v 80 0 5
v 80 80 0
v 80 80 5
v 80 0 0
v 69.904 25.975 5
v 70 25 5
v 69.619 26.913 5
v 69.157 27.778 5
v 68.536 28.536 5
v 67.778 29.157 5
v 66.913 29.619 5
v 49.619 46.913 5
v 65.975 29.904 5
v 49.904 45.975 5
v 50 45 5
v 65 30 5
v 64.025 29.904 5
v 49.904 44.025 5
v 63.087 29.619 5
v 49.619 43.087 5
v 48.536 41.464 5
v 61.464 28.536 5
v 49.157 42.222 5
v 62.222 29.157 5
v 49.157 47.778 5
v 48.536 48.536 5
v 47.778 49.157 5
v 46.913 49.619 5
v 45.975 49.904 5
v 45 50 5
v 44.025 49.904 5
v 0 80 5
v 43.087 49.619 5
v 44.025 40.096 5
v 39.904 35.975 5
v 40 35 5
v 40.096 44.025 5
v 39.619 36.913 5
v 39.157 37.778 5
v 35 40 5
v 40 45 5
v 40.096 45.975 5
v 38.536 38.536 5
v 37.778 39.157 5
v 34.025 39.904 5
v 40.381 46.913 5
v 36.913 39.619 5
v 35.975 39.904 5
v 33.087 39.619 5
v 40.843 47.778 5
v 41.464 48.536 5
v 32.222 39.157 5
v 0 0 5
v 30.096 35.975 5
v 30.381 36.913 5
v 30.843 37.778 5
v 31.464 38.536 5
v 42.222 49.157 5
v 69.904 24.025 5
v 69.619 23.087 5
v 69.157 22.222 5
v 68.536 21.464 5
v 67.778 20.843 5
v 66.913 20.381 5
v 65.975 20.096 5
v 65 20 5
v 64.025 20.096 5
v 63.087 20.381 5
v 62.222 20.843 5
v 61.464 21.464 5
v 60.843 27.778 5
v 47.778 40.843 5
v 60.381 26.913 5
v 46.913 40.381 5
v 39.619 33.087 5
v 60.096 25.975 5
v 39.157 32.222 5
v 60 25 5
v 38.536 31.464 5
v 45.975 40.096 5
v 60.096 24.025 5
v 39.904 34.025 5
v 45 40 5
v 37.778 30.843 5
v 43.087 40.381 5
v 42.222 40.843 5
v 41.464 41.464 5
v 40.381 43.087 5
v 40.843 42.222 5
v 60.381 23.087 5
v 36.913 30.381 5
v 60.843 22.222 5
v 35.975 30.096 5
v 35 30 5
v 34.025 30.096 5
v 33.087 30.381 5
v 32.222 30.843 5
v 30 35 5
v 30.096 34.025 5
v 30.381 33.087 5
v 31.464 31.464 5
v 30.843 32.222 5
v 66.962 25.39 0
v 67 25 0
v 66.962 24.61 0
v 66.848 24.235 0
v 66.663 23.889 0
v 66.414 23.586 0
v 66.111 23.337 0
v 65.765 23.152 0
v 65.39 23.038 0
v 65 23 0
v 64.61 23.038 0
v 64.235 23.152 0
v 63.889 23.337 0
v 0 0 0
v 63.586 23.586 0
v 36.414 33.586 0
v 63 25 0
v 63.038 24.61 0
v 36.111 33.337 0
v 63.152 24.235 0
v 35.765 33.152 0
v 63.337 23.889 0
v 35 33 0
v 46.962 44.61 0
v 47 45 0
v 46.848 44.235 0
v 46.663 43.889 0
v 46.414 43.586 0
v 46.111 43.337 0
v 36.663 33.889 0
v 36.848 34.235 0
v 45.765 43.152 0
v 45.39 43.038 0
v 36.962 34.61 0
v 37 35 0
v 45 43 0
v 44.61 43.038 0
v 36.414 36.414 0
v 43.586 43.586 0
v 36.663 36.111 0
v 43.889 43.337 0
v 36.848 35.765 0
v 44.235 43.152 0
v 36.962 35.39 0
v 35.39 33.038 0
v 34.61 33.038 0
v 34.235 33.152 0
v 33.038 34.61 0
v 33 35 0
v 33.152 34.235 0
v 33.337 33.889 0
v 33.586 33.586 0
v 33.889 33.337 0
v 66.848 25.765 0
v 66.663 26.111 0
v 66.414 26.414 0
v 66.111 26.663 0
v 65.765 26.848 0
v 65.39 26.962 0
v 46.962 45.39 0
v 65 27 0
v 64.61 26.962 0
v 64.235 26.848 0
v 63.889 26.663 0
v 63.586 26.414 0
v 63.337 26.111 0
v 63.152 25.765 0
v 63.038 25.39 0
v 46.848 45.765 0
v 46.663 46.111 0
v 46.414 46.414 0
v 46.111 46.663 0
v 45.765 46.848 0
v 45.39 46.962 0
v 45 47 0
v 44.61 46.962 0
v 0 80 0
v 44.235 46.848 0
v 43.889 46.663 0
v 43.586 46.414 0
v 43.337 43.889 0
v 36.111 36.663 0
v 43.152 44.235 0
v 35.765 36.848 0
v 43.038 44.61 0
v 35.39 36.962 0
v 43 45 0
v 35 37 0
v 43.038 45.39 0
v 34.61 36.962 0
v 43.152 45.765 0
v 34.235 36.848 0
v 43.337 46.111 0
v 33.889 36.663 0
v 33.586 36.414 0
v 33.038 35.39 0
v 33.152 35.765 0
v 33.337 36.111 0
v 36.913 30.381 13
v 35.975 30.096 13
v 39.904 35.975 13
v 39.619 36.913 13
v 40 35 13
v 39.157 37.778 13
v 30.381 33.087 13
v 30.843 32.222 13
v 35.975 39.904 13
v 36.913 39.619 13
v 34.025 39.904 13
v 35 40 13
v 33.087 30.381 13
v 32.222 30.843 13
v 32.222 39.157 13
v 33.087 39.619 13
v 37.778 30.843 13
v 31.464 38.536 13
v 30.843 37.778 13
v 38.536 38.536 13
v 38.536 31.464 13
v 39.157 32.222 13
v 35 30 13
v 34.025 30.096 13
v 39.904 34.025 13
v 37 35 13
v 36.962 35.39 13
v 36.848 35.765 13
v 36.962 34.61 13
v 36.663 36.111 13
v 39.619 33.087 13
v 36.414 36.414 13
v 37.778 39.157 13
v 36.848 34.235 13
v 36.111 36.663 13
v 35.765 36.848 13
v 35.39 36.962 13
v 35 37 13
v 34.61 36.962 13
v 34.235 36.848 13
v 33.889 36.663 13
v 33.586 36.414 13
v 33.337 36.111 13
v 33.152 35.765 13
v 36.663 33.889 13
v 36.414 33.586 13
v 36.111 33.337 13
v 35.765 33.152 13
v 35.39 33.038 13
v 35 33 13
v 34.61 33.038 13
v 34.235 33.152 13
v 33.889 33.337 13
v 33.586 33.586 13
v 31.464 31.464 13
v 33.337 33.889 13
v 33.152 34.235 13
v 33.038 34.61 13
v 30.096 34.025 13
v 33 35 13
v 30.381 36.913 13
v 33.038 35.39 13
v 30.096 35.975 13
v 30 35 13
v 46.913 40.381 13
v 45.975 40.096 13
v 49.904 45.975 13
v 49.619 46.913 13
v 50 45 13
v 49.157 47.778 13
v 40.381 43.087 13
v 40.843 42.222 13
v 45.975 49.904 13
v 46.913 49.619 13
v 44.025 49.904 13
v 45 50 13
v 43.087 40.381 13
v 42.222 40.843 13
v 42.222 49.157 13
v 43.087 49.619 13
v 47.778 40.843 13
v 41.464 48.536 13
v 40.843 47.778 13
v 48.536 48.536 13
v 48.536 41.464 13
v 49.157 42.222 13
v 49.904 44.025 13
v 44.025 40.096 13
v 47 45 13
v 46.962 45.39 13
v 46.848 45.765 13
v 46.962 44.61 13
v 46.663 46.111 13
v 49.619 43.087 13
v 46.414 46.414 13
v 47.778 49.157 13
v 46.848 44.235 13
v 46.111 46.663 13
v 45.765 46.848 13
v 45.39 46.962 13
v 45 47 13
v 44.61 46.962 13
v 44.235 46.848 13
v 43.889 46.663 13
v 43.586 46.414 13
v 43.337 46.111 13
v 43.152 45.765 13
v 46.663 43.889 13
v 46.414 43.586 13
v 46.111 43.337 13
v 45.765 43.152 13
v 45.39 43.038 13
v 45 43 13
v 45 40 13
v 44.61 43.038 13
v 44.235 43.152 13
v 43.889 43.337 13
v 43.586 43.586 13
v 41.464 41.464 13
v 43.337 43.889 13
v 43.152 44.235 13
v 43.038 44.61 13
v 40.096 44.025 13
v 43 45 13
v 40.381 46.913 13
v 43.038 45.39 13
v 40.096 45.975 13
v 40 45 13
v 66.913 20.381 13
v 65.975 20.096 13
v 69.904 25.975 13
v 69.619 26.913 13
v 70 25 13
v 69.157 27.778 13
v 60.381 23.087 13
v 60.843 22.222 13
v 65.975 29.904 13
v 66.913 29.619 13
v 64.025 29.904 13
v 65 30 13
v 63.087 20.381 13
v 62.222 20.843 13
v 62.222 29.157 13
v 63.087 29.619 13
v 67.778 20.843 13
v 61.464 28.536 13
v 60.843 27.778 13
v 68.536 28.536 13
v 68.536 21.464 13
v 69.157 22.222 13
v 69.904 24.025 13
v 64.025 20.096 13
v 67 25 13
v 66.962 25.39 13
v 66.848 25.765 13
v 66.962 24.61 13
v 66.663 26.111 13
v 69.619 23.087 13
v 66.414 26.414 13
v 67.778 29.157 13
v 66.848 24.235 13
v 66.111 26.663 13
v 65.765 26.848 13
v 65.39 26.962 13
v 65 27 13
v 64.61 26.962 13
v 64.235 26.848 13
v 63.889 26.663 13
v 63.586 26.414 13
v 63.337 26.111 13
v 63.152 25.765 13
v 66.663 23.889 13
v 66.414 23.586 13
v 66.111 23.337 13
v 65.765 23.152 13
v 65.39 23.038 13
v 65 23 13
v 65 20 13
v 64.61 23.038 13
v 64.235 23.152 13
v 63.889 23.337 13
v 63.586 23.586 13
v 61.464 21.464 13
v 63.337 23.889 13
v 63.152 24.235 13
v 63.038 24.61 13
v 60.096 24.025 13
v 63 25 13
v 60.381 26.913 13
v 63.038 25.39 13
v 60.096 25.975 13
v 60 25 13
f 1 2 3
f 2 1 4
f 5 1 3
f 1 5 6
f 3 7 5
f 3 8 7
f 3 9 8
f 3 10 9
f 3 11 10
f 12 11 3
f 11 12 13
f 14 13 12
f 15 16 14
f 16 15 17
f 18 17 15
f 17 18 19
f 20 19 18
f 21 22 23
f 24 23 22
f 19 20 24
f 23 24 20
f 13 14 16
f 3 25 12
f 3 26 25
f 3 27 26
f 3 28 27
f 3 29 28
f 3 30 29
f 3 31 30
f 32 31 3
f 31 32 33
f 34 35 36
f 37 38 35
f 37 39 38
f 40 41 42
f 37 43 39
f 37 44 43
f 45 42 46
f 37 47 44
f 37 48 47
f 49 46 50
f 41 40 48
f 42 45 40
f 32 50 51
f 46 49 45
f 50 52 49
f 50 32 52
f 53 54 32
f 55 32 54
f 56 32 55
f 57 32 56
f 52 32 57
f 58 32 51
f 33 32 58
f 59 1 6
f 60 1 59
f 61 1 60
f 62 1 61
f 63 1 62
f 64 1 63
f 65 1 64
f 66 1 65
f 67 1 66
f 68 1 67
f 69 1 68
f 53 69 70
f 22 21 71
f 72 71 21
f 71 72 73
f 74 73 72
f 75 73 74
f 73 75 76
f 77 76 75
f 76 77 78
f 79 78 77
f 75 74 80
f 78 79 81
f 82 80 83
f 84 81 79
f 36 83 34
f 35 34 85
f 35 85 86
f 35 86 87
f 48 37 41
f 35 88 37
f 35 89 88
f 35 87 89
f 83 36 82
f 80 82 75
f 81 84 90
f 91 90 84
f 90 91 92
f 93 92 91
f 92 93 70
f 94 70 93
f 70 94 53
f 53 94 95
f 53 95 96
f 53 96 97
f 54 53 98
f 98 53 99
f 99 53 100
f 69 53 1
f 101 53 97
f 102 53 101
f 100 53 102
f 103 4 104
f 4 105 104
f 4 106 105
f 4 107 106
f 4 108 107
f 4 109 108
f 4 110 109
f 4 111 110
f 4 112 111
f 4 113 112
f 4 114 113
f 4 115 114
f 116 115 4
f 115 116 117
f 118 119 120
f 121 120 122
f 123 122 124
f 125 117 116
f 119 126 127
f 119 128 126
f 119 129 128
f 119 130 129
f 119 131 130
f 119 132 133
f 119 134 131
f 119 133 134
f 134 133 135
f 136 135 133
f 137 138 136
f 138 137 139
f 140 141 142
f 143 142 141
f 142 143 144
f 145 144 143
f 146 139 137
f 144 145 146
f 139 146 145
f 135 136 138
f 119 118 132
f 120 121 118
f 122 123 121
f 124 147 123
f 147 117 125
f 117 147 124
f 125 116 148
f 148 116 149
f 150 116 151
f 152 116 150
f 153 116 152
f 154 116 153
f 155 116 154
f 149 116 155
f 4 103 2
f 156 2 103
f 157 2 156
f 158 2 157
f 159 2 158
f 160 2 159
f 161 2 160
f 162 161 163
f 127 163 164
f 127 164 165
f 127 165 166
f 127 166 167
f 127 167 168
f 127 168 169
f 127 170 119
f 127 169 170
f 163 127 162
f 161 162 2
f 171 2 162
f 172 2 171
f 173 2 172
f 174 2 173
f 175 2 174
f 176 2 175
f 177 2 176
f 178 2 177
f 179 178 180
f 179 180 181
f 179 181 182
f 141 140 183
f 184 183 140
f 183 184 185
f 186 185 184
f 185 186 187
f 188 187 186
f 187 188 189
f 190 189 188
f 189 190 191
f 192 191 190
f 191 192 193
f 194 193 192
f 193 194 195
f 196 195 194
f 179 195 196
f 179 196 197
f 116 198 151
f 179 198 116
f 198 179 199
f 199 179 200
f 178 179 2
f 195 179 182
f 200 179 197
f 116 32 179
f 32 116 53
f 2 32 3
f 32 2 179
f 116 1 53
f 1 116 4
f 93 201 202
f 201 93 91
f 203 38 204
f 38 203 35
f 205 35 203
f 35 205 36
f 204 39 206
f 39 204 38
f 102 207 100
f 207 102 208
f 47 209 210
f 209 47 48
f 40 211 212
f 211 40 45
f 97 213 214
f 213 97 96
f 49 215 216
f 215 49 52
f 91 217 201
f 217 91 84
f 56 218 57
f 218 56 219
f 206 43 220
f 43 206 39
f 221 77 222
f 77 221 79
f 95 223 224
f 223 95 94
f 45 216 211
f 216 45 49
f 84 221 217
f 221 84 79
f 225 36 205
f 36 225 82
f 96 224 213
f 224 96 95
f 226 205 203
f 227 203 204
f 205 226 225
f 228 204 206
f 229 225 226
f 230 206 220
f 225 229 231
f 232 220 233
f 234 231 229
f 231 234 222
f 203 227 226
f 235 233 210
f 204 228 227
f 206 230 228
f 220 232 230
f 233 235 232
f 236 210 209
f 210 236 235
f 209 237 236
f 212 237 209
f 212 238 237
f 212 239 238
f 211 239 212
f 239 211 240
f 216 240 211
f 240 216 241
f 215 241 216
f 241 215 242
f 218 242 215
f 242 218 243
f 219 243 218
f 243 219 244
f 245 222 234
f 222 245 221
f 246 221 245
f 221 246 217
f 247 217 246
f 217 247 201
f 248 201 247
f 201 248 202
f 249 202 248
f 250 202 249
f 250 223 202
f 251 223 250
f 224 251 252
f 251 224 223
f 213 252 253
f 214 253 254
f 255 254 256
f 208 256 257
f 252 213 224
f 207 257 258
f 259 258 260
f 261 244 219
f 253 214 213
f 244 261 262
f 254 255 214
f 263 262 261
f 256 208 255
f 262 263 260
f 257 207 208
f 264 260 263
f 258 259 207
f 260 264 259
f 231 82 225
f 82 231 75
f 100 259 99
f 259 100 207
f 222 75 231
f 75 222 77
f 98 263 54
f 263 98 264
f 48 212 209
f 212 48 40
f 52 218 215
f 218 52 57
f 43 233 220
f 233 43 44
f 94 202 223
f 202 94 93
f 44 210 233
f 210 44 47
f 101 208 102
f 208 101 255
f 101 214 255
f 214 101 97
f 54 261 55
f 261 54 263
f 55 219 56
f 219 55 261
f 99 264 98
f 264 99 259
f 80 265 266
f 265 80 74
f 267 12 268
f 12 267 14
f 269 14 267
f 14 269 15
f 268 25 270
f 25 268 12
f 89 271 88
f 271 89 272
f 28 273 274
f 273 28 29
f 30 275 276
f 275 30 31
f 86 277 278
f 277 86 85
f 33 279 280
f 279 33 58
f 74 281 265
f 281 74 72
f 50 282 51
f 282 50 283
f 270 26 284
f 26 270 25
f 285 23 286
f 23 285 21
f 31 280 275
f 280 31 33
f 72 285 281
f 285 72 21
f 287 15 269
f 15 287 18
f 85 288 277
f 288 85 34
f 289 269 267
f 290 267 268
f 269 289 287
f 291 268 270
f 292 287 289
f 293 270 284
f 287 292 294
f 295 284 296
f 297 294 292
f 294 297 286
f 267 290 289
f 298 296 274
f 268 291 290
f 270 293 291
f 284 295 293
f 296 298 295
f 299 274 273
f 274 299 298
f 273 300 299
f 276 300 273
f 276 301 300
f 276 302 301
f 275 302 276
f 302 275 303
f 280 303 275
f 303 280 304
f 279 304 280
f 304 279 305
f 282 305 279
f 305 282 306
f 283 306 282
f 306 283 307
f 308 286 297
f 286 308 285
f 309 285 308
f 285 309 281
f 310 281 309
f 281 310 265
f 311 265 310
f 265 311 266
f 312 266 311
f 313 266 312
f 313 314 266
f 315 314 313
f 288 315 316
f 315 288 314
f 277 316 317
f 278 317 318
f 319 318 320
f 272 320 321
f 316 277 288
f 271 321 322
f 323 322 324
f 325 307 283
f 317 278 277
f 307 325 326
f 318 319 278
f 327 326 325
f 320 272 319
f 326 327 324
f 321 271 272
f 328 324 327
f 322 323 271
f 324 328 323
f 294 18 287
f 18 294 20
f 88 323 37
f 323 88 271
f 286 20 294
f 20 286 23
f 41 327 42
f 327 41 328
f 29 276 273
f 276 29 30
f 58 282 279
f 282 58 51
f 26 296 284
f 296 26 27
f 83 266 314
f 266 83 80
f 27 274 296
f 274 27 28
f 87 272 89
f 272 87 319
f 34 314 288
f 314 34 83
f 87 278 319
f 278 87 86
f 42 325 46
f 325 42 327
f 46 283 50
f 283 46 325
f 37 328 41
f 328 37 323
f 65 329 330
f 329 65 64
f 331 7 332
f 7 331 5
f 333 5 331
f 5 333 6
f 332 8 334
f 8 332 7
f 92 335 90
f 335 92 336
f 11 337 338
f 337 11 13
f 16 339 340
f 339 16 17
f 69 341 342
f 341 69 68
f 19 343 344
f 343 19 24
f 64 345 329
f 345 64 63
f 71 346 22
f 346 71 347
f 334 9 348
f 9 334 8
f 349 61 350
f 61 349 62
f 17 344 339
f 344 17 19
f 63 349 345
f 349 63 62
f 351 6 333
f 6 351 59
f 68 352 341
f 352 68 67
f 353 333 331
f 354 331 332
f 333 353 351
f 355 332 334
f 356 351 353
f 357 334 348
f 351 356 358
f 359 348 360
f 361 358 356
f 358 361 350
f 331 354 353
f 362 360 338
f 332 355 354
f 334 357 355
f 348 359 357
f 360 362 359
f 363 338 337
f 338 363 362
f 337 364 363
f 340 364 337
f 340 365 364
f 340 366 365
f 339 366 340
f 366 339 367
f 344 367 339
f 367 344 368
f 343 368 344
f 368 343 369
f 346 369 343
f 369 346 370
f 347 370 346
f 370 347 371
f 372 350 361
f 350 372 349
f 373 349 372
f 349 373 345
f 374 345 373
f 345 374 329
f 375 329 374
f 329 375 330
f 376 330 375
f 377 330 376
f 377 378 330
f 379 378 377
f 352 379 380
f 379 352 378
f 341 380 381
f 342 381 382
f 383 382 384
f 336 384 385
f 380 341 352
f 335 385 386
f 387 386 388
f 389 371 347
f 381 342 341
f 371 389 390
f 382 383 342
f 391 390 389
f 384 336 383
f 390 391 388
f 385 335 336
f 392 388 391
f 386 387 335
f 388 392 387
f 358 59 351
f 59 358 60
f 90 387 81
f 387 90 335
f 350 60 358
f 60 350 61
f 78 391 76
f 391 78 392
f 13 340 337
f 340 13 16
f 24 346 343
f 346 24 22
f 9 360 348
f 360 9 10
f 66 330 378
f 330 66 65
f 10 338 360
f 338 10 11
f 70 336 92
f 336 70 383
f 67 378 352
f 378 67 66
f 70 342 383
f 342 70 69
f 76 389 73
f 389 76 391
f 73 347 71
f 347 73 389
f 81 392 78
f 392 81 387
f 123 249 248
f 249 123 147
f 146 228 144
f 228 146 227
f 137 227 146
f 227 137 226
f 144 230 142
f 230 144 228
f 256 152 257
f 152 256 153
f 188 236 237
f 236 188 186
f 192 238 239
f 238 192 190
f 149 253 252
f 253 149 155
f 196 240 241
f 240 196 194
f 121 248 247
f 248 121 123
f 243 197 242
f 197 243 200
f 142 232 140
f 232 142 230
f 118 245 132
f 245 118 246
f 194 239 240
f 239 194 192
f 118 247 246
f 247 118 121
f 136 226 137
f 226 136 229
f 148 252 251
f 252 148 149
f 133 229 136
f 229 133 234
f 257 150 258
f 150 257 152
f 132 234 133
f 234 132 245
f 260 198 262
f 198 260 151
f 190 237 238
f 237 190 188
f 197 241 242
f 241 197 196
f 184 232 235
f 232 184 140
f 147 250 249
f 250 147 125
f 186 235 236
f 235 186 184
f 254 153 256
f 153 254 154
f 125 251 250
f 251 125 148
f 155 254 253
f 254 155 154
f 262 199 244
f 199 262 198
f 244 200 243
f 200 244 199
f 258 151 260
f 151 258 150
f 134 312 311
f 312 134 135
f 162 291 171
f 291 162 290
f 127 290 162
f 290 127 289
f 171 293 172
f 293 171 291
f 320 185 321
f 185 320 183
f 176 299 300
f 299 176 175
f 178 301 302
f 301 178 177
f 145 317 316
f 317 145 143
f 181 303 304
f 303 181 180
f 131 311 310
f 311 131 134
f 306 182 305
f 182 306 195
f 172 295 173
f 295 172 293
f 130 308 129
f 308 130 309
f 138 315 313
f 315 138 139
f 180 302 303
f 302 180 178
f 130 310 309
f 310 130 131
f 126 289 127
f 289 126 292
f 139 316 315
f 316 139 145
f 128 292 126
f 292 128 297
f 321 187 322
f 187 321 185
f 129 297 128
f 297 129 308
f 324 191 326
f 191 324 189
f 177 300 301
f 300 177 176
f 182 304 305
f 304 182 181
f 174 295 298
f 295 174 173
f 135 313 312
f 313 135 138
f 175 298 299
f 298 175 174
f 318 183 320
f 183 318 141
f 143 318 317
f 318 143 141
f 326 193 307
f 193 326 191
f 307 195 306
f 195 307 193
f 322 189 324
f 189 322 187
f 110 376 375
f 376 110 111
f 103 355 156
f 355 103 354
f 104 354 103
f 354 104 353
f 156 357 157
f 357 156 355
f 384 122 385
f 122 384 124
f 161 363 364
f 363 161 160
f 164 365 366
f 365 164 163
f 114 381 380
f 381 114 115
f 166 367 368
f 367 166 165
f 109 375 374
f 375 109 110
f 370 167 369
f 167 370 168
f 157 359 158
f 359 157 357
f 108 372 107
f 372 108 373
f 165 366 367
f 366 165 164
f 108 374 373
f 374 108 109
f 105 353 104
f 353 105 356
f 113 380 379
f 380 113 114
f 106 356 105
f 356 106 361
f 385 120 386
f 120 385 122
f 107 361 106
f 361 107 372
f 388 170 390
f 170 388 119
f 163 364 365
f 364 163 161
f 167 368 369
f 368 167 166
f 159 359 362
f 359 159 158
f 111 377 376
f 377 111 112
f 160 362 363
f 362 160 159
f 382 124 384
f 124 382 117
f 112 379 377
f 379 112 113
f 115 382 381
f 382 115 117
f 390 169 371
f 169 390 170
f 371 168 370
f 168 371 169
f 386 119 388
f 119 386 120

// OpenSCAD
$fn = 32;

// ----------------------------------------------------------------------
// Boss field: plate with bosses at given coordinates
// ----------------------------------------------------------------------

// --- parameters (mm) ---
plate_l = 80;             // plate length, X
plate_w = 80;             // plate width, Y
plate_t = 5;              // plate thickness, Z
boss_d = 10;              // boss diameter
boss_h = 8;               // boss height above the plate
bore_d = 4;               // boss bore

total_h = plate_t + boss_h;  // overall height

difference() {
  union() {
    cube([plate_l, plate_w, plate_t]);
    translate([35, 35, plate_t]) cylinder(h = boss_h, d = boss_d);
    translate([45, 45, plate_t]) cylinder(h = boss_h, d = boss_d);
    translate([65, 25, plate_t]) cylinder(h = boss_h, d = boss_d);
  }
  translate([35, 35, -1]) cylinder(h = total_h + 2, d = bore_d);
  translate([45, 45, -1]) cylinder(h = total_h + 2, d = bore_d);
  translate([65, 25, -1]) cylinder(h = total_h + 2, d = bore_d);
}
